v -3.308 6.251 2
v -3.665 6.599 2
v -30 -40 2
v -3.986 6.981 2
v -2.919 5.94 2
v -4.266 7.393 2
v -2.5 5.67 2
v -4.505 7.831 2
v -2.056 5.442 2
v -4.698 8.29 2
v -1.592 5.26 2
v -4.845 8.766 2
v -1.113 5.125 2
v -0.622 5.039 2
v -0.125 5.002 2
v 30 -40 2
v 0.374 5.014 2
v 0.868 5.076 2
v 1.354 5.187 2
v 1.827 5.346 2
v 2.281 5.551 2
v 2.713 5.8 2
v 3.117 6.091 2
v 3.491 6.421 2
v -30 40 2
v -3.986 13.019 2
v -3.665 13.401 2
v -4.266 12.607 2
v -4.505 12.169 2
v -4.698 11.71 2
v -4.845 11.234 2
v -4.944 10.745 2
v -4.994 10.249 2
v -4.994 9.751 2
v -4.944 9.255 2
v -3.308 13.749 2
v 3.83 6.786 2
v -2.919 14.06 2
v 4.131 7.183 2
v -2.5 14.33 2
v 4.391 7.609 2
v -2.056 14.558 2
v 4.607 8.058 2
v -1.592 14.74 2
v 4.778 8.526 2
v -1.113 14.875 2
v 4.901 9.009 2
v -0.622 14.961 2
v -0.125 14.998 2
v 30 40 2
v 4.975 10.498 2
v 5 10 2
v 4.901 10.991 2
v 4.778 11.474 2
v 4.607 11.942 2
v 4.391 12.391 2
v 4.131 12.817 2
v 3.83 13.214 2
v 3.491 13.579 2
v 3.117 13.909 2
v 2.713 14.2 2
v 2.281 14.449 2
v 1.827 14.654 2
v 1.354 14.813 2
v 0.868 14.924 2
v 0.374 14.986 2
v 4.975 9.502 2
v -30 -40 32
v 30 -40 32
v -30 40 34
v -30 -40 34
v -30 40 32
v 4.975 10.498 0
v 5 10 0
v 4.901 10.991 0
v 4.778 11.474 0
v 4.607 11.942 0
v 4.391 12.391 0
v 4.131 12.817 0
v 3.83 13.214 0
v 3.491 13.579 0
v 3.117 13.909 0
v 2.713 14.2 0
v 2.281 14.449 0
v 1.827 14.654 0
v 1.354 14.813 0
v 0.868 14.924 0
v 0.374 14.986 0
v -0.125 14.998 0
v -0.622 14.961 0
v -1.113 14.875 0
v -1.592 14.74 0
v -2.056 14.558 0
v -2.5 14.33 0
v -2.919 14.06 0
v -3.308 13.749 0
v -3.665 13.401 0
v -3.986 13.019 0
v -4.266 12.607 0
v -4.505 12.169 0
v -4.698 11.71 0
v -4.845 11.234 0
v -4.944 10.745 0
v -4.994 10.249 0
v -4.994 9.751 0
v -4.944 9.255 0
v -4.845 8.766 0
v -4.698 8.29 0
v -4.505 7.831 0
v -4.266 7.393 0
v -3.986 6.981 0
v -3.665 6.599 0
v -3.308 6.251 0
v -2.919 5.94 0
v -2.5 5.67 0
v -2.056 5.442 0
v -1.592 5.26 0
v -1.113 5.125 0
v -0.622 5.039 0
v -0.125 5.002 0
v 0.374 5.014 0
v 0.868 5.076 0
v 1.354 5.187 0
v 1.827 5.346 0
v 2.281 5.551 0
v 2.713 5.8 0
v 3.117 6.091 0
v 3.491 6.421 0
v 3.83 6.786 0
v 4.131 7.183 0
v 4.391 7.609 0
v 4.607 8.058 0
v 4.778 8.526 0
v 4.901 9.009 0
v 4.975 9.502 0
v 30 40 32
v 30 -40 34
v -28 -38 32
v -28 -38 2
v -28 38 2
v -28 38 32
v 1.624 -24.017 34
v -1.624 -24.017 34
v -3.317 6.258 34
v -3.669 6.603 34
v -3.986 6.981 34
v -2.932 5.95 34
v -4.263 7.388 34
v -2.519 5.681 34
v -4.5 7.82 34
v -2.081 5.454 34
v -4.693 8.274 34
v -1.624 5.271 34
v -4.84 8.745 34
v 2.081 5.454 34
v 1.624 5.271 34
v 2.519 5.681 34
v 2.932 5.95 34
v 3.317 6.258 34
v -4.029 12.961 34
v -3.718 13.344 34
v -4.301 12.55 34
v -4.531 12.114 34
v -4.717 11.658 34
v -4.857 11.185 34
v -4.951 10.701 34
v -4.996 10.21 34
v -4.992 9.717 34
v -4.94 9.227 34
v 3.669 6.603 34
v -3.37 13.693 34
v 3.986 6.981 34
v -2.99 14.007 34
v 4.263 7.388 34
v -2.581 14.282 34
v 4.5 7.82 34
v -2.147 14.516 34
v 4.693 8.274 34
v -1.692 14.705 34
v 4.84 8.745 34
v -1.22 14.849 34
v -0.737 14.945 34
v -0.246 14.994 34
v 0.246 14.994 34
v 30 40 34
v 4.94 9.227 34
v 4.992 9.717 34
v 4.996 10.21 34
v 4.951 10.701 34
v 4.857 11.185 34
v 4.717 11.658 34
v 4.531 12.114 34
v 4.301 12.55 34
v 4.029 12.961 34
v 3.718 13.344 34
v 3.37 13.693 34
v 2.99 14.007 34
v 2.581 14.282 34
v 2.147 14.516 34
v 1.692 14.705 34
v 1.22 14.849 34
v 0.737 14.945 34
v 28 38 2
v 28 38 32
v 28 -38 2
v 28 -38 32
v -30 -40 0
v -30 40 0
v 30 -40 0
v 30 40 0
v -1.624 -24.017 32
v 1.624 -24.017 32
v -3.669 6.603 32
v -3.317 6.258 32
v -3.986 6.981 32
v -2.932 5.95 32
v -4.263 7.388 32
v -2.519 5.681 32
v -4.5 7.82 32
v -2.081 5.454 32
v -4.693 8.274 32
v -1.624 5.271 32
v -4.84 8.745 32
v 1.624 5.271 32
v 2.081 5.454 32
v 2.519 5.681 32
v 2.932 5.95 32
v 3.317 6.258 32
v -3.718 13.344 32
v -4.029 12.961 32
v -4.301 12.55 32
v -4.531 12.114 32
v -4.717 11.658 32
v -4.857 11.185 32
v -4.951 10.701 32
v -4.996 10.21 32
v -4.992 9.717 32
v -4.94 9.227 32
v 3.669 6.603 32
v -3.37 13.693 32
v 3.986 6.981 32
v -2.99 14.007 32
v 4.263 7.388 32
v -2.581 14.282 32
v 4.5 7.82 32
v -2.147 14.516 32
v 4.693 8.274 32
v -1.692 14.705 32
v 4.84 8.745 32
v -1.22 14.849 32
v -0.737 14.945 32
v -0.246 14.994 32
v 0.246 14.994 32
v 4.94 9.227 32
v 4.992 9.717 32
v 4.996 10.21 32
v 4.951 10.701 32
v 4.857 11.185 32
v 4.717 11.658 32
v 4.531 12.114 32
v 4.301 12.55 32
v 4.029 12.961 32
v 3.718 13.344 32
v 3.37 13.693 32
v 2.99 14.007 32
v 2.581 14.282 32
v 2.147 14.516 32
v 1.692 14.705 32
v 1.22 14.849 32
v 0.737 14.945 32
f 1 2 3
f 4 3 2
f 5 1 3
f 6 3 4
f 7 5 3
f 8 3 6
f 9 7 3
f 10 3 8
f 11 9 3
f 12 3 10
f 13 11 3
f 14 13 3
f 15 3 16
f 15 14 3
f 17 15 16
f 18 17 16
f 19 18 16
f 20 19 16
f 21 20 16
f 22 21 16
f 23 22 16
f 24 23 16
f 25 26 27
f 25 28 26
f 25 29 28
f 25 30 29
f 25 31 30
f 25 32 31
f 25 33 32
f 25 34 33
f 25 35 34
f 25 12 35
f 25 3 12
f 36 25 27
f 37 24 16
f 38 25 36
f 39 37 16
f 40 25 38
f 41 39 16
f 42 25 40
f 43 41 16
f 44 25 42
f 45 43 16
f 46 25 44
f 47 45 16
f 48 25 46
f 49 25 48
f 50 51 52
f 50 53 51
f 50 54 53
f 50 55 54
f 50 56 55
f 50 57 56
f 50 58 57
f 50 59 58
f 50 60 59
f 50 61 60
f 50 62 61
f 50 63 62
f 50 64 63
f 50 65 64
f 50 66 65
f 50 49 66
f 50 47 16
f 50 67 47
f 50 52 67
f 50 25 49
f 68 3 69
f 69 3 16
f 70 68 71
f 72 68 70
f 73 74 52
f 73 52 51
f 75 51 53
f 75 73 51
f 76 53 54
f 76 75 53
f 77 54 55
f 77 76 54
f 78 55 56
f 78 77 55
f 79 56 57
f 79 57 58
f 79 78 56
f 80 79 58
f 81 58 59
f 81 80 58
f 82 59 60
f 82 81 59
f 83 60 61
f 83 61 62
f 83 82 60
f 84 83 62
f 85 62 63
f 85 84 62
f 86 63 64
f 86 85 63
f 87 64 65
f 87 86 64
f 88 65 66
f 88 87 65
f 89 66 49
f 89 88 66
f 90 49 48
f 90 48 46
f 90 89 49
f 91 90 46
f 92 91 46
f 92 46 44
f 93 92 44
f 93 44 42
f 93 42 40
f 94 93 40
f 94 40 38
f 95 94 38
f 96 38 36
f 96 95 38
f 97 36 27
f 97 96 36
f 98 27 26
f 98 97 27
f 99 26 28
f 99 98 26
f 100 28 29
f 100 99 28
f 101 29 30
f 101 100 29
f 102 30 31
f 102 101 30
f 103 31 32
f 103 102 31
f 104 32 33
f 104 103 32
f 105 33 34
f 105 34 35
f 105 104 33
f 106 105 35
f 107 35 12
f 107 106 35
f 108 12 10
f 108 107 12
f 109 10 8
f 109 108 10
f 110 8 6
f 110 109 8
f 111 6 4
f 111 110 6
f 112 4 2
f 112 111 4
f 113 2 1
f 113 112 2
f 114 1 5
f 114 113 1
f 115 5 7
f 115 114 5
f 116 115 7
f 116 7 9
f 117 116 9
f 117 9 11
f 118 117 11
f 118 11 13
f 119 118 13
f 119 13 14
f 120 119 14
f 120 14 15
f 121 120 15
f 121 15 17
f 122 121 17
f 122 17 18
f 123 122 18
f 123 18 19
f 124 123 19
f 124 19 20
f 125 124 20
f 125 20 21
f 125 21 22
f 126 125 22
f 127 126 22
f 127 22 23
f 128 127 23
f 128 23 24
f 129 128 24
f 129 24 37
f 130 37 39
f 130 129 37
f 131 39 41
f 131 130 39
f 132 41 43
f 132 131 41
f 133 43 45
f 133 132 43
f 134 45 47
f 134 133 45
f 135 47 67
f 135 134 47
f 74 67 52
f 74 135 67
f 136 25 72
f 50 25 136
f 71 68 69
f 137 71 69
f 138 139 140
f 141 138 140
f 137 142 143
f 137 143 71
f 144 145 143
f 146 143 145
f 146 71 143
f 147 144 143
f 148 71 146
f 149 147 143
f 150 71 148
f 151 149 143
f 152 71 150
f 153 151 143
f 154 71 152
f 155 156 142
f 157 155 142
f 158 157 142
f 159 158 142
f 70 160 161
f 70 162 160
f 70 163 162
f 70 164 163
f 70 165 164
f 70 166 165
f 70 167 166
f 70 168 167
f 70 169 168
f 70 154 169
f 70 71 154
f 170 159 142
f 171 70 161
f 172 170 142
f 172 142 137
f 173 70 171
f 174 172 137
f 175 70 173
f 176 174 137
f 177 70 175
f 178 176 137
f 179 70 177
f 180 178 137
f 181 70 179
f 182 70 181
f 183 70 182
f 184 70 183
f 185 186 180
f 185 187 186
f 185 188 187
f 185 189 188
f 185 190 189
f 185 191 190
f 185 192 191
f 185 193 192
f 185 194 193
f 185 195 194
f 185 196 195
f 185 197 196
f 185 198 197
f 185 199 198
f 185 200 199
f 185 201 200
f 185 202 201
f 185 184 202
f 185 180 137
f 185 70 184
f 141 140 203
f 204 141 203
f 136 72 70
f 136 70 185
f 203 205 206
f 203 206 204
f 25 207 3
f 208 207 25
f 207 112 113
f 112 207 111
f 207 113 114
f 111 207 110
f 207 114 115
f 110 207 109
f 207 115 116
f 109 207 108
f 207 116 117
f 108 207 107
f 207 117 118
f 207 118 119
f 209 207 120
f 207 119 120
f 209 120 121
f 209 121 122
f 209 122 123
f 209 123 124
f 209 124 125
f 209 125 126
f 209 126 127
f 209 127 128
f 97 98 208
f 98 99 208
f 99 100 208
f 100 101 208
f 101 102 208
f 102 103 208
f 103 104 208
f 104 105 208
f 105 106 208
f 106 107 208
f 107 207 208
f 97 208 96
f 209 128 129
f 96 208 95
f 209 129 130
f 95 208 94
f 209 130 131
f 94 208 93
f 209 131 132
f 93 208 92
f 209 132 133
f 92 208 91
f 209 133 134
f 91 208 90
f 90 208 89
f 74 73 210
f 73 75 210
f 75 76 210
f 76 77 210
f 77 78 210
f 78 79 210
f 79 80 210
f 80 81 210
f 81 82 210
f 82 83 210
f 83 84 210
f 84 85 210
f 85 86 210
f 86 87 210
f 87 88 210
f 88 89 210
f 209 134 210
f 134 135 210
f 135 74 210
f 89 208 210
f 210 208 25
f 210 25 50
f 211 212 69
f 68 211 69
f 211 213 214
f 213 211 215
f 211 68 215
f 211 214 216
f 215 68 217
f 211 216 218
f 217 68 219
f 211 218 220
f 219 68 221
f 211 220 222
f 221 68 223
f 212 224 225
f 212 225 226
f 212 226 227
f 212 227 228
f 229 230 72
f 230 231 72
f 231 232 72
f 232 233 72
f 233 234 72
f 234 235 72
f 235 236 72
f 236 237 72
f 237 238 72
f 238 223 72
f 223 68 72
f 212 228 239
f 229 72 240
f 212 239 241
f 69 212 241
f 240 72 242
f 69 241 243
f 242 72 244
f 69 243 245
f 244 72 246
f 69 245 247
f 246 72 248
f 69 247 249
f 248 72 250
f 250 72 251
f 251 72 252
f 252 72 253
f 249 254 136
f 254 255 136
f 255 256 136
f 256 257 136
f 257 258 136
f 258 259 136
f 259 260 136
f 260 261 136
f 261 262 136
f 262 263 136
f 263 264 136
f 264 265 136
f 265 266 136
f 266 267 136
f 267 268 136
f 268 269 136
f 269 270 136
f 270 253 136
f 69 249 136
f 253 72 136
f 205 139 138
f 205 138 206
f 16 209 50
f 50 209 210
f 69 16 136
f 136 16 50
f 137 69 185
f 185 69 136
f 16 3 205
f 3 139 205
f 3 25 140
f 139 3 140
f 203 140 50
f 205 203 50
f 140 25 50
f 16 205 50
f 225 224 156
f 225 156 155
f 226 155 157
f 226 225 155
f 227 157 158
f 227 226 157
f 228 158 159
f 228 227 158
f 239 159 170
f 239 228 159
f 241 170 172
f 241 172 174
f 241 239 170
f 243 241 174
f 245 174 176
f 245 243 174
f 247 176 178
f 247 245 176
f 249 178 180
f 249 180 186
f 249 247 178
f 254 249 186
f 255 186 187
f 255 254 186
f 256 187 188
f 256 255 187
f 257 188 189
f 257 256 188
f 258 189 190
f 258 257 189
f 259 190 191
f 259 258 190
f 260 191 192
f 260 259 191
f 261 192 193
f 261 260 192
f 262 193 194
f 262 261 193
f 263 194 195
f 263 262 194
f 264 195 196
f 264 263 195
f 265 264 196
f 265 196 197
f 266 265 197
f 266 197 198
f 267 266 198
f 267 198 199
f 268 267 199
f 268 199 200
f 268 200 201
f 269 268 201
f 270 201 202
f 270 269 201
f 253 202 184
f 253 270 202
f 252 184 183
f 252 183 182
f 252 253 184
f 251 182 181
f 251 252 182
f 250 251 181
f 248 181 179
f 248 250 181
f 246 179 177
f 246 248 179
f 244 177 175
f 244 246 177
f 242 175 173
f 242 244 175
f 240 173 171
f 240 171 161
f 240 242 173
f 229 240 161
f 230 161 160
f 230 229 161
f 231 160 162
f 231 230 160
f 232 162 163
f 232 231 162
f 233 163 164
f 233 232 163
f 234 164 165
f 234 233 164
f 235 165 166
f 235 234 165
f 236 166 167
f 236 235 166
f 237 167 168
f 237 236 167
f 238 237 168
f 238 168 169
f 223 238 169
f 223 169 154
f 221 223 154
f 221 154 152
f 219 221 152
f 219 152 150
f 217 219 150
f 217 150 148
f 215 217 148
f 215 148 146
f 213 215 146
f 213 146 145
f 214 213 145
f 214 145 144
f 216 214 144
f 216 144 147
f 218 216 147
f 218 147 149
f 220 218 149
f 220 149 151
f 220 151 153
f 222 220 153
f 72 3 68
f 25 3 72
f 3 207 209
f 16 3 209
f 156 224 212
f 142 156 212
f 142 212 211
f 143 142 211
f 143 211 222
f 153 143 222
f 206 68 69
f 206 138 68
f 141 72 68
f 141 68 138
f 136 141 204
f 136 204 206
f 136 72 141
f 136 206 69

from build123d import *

# Parameters (mm, degrees)
SKETCH_W      = 60
SKETCH_H      = 80
SKETCH_R      = 5
PAD_DEPTH     = 2
SKETCH001_W   = 60
SKETCH001_H   = 80
SKETCH001_W_2 = 56
SKETCH001_H_2 = 76
PAD001_DEPTH  = 30
SKETCH002_W   = 60
SKETCH002_H   = 80
PAD002_DEPTH  = 2


with BuildPart() as back_plate:
    # Sketch → Pad (new body)
    with BuildSketch(Plane.XY):
        Rectangle(SKETCH_W, SKETCH_H)
        with Locations((0, 10)):
            Circle(SKETCH_R, mode=Mode.SUBTRACT)
    extrude(amount=PAD_DEPTH)


with BuildPart() as sides:
    # Sketch001 → Pad001 (new body)
    with BuildSketch(Plane.XY.offset(2)):
        Rectangle(SKETCH001_W, SKETCH001_H)
        Rectangle(SKETCH001_W_2, SKETCH001_H_2, mode=Mode.SUBTRACT)
    extrude(amount=PAD001_DEPTH)


with BuildPart() as front_plate:
    # Sketch002 → Pad002 (new body)
    with BuildSketch(Plane.XY.offset(32)):
        Rectangle(SKETCH002_W, SKETCH002_H)
        with BuildLine():
            ThreePointArc((1.623618, 5.270955), (0, 15), (-1.623618, 5.270955))
            Line((-1.623618, -24.016518), (-1.623618, 5.270955))
            Line((1.623618, -24.016518), (-1.623618, -24.016518))
            Line((1.623618, 5.270955), (1.623618, -24.016518))
        make_face(mode=Mode.SUBTRACT)
    extrude(amount=PAD002_DEPTH)


solid = Compound([back_plate.part, sides.part, front_plate.part])
